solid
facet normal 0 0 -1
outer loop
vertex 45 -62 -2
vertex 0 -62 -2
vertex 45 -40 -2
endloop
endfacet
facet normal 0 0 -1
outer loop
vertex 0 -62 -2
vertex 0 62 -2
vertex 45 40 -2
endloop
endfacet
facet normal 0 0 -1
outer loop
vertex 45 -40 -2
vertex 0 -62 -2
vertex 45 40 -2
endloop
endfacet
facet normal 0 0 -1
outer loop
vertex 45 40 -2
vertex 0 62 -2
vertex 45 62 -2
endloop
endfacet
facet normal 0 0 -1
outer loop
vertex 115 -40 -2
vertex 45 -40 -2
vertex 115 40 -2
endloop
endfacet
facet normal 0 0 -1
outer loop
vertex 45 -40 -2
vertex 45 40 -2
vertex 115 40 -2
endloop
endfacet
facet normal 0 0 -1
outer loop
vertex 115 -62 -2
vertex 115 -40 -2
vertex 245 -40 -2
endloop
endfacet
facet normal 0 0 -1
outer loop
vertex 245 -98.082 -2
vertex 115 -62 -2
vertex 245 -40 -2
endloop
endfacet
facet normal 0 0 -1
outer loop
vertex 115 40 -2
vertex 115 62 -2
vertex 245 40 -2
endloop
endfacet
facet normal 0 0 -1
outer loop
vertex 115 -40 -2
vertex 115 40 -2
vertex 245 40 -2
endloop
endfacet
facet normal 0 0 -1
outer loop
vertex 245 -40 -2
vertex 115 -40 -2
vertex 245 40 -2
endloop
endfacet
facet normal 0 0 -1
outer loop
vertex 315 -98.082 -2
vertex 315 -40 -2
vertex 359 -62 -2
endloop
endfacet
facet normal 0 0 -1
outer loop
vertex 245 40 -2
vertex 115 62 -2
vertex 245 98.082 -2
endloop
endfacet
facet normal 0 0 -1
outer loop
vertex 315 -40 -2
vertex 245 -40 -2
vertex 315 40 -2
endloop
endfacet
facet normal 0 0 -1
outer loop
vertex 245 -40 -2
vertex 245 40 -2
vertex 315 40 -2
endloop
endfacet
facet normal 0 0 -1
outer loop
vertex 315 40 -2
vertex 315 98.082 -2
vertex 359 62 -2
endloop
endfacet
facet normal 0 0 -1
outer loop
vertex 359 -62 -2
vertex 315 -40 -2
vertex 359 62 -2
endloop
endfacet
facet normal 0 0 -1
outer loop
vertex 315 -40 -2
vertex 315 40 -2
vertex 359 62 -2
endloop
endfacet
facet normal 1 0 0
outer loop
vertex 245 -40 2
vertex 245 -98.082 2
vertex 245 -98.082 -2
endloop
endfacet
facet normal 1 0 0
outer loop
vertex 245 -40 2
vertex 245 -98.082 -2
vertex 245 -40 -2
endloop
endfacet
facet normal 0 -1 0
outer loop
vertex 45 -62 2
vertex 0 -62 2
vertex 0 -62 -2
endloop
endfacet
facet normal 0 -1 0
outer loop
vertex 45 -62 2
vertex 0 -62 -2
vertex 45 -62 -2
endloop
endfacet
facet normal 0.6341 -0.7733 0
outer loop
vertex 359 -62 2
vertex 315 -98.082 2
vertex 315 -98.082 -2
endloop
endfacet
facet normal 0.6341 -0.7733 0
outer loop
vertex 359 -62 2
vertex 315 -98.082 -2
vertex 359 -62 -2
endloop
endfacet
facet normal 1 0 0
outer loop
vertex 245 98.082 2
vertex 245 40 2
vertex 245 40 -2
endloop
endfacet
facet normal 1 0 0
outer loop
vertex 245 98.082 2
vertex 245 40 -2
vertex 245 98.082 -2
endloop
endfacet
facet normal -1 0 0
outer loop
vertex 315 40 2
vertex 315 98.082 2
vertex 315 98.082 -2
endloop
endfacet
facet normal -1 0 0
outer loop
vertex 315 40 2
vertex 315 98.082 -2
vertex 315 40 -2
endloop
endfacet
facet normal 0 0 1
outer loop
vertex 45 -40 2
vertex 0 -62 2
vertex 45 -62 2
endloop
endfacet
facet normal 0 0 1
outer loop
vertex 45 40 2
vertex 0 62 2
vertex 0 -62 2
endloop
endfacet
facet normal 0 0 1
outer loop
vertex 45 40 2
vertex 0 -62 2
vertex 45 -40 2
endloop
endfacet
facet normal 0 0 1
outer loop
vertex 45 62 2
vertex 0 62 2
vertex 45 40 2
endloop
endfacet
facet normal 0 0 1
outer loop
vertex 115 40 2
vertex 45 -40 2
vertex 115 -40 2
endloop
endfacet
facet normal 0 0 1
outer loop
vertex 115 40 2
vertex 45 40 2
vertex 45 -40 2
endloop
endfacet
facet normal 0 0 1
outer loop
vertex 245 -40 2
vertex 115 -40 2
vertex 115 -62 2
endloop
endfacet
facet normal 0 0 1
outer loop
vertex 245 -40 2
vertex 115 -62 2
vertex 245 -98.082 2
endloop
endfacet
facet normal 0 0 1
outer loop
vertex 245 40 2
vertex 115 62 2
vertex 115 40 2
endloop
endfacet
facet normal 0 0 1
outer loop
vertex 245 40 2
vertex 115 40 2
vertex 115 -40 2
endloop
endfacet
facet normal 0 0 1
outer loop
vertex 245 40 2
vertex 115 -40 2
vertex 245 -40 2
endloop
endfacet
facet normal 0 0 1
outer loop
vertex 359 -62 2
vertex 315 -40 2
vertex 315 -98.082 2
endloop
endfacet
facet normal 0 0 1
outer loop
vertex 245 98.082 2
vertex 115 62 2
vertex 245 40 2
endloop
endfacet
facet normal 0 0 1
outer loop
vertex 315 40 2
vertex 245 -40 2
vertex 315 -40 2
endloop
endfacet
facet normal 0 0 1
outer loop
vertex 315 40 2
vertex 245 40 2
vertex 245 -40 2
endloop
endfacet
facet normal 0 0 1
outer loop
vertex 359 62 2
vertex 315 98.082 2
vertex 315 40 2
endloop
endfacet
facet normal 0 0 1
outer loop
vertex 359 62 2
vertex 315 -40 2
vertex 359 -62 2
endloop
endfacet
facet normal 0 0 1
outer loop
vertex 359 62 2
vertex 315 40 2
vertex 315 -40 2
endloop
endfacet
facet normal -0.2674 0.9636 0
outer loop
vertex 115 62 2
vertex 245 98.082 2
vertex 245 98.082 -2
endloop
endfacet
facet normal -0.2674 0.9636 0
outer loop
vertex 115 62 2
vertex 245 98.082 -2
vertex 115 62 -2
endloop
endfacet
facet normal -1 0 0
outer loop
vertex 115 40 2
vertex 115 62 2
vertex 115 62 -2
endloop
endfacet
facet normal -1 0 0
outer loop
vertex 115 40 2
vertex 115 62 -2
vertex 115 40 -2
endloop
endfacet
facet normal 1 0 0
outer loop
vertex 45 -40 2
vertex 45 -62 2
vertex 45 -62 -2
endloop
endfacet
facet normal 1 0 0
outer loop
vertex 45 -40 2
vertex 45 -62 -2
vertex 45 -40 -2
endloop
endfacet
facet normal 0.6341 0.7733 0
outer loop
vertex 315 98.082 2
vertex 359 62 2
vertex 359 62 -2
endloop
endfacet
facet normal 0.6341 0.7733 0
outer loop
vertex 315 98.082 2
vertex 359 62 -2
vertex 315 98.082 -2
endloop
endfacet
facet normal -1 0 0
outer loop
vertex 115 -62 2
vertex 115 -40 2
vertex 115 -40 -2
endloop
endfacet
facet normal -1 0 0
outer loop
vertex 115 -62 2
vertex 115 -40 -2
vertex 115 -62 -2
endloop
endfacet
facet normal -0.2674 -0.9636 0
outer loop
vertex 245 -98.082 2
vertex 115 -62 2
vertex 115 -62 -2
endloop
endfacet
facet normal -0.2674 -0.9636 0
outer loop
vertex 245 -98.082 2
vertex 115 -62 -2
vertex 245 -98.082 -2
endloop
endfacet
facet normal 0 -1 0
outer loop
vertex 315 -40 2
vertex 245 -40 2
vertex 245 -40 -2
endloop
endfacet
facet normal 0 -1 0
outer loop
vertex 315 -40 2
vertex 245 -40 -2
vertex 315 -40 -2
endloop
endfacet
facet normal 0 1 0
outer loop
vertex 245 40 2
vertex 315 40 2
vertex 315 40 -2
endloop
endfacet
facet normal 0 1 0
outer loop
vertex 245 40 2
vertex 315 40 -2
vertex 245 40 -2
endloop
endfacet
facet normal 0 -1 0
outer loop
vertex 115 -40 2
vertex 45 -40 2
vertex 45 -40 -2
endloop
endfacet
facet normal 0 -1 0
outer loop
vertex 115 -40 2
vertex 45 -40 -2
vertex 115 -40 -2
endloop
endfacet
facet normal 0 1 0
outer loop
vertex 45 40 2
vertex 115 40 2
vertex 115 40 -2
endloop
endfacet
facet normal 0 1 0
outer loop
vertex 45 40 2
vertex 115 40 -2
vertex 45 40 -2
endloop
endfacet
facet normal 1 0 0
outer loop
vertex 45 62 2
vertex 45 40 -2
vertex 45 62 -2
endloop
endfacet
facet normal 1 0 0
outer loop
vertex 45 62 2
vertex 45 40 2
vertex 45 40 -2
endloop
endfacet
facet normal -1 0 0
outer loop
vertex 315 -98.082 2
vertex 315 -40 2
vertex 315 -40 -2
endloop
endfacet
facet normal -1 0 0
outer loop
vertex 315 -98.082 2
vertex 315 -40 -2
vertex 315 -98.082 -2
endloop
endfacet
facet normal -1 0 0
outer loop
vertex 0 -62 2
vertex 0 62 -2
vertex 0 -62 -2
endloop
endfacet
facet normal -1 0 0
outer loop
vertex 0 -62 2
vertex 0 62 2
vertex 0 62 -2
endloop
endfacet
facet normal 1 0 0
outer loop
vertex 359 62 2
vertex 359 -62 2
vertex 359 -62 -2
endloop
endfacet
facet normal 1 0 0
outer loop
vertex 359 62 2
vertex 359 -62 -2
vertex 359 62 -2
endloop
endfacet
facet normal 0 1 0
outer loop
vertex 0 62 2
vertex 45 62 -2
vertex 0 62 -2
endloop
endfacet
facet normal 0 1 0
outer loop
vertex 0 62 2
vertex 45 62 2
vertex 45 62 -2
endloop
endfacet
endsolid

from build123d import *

# Parameters (mm, degrees)
F1_DEPTH = 2


with BuildPart() as f1:
    # F0 (on Top) → F1 (new body, symmetric)
    with BuildSketch(Plane.XY):
        Polygon((0, 62), (0, 0), (0, -62), (45, -62), (45, -40), (115, -40), (115, -62), (245, -98.081973), (245, -40), (315, -40), (315, -98.081973), (359, -62), (359, 0), (359, 62), (315, 98.081973), (315, 40), (245, 40), (245, 98.081973), (115, 62), (115, 40), (45, 40), (45, 62), align=None)
    extrude(amount=F1_DEPTH, both=True)


solid = f1.part
